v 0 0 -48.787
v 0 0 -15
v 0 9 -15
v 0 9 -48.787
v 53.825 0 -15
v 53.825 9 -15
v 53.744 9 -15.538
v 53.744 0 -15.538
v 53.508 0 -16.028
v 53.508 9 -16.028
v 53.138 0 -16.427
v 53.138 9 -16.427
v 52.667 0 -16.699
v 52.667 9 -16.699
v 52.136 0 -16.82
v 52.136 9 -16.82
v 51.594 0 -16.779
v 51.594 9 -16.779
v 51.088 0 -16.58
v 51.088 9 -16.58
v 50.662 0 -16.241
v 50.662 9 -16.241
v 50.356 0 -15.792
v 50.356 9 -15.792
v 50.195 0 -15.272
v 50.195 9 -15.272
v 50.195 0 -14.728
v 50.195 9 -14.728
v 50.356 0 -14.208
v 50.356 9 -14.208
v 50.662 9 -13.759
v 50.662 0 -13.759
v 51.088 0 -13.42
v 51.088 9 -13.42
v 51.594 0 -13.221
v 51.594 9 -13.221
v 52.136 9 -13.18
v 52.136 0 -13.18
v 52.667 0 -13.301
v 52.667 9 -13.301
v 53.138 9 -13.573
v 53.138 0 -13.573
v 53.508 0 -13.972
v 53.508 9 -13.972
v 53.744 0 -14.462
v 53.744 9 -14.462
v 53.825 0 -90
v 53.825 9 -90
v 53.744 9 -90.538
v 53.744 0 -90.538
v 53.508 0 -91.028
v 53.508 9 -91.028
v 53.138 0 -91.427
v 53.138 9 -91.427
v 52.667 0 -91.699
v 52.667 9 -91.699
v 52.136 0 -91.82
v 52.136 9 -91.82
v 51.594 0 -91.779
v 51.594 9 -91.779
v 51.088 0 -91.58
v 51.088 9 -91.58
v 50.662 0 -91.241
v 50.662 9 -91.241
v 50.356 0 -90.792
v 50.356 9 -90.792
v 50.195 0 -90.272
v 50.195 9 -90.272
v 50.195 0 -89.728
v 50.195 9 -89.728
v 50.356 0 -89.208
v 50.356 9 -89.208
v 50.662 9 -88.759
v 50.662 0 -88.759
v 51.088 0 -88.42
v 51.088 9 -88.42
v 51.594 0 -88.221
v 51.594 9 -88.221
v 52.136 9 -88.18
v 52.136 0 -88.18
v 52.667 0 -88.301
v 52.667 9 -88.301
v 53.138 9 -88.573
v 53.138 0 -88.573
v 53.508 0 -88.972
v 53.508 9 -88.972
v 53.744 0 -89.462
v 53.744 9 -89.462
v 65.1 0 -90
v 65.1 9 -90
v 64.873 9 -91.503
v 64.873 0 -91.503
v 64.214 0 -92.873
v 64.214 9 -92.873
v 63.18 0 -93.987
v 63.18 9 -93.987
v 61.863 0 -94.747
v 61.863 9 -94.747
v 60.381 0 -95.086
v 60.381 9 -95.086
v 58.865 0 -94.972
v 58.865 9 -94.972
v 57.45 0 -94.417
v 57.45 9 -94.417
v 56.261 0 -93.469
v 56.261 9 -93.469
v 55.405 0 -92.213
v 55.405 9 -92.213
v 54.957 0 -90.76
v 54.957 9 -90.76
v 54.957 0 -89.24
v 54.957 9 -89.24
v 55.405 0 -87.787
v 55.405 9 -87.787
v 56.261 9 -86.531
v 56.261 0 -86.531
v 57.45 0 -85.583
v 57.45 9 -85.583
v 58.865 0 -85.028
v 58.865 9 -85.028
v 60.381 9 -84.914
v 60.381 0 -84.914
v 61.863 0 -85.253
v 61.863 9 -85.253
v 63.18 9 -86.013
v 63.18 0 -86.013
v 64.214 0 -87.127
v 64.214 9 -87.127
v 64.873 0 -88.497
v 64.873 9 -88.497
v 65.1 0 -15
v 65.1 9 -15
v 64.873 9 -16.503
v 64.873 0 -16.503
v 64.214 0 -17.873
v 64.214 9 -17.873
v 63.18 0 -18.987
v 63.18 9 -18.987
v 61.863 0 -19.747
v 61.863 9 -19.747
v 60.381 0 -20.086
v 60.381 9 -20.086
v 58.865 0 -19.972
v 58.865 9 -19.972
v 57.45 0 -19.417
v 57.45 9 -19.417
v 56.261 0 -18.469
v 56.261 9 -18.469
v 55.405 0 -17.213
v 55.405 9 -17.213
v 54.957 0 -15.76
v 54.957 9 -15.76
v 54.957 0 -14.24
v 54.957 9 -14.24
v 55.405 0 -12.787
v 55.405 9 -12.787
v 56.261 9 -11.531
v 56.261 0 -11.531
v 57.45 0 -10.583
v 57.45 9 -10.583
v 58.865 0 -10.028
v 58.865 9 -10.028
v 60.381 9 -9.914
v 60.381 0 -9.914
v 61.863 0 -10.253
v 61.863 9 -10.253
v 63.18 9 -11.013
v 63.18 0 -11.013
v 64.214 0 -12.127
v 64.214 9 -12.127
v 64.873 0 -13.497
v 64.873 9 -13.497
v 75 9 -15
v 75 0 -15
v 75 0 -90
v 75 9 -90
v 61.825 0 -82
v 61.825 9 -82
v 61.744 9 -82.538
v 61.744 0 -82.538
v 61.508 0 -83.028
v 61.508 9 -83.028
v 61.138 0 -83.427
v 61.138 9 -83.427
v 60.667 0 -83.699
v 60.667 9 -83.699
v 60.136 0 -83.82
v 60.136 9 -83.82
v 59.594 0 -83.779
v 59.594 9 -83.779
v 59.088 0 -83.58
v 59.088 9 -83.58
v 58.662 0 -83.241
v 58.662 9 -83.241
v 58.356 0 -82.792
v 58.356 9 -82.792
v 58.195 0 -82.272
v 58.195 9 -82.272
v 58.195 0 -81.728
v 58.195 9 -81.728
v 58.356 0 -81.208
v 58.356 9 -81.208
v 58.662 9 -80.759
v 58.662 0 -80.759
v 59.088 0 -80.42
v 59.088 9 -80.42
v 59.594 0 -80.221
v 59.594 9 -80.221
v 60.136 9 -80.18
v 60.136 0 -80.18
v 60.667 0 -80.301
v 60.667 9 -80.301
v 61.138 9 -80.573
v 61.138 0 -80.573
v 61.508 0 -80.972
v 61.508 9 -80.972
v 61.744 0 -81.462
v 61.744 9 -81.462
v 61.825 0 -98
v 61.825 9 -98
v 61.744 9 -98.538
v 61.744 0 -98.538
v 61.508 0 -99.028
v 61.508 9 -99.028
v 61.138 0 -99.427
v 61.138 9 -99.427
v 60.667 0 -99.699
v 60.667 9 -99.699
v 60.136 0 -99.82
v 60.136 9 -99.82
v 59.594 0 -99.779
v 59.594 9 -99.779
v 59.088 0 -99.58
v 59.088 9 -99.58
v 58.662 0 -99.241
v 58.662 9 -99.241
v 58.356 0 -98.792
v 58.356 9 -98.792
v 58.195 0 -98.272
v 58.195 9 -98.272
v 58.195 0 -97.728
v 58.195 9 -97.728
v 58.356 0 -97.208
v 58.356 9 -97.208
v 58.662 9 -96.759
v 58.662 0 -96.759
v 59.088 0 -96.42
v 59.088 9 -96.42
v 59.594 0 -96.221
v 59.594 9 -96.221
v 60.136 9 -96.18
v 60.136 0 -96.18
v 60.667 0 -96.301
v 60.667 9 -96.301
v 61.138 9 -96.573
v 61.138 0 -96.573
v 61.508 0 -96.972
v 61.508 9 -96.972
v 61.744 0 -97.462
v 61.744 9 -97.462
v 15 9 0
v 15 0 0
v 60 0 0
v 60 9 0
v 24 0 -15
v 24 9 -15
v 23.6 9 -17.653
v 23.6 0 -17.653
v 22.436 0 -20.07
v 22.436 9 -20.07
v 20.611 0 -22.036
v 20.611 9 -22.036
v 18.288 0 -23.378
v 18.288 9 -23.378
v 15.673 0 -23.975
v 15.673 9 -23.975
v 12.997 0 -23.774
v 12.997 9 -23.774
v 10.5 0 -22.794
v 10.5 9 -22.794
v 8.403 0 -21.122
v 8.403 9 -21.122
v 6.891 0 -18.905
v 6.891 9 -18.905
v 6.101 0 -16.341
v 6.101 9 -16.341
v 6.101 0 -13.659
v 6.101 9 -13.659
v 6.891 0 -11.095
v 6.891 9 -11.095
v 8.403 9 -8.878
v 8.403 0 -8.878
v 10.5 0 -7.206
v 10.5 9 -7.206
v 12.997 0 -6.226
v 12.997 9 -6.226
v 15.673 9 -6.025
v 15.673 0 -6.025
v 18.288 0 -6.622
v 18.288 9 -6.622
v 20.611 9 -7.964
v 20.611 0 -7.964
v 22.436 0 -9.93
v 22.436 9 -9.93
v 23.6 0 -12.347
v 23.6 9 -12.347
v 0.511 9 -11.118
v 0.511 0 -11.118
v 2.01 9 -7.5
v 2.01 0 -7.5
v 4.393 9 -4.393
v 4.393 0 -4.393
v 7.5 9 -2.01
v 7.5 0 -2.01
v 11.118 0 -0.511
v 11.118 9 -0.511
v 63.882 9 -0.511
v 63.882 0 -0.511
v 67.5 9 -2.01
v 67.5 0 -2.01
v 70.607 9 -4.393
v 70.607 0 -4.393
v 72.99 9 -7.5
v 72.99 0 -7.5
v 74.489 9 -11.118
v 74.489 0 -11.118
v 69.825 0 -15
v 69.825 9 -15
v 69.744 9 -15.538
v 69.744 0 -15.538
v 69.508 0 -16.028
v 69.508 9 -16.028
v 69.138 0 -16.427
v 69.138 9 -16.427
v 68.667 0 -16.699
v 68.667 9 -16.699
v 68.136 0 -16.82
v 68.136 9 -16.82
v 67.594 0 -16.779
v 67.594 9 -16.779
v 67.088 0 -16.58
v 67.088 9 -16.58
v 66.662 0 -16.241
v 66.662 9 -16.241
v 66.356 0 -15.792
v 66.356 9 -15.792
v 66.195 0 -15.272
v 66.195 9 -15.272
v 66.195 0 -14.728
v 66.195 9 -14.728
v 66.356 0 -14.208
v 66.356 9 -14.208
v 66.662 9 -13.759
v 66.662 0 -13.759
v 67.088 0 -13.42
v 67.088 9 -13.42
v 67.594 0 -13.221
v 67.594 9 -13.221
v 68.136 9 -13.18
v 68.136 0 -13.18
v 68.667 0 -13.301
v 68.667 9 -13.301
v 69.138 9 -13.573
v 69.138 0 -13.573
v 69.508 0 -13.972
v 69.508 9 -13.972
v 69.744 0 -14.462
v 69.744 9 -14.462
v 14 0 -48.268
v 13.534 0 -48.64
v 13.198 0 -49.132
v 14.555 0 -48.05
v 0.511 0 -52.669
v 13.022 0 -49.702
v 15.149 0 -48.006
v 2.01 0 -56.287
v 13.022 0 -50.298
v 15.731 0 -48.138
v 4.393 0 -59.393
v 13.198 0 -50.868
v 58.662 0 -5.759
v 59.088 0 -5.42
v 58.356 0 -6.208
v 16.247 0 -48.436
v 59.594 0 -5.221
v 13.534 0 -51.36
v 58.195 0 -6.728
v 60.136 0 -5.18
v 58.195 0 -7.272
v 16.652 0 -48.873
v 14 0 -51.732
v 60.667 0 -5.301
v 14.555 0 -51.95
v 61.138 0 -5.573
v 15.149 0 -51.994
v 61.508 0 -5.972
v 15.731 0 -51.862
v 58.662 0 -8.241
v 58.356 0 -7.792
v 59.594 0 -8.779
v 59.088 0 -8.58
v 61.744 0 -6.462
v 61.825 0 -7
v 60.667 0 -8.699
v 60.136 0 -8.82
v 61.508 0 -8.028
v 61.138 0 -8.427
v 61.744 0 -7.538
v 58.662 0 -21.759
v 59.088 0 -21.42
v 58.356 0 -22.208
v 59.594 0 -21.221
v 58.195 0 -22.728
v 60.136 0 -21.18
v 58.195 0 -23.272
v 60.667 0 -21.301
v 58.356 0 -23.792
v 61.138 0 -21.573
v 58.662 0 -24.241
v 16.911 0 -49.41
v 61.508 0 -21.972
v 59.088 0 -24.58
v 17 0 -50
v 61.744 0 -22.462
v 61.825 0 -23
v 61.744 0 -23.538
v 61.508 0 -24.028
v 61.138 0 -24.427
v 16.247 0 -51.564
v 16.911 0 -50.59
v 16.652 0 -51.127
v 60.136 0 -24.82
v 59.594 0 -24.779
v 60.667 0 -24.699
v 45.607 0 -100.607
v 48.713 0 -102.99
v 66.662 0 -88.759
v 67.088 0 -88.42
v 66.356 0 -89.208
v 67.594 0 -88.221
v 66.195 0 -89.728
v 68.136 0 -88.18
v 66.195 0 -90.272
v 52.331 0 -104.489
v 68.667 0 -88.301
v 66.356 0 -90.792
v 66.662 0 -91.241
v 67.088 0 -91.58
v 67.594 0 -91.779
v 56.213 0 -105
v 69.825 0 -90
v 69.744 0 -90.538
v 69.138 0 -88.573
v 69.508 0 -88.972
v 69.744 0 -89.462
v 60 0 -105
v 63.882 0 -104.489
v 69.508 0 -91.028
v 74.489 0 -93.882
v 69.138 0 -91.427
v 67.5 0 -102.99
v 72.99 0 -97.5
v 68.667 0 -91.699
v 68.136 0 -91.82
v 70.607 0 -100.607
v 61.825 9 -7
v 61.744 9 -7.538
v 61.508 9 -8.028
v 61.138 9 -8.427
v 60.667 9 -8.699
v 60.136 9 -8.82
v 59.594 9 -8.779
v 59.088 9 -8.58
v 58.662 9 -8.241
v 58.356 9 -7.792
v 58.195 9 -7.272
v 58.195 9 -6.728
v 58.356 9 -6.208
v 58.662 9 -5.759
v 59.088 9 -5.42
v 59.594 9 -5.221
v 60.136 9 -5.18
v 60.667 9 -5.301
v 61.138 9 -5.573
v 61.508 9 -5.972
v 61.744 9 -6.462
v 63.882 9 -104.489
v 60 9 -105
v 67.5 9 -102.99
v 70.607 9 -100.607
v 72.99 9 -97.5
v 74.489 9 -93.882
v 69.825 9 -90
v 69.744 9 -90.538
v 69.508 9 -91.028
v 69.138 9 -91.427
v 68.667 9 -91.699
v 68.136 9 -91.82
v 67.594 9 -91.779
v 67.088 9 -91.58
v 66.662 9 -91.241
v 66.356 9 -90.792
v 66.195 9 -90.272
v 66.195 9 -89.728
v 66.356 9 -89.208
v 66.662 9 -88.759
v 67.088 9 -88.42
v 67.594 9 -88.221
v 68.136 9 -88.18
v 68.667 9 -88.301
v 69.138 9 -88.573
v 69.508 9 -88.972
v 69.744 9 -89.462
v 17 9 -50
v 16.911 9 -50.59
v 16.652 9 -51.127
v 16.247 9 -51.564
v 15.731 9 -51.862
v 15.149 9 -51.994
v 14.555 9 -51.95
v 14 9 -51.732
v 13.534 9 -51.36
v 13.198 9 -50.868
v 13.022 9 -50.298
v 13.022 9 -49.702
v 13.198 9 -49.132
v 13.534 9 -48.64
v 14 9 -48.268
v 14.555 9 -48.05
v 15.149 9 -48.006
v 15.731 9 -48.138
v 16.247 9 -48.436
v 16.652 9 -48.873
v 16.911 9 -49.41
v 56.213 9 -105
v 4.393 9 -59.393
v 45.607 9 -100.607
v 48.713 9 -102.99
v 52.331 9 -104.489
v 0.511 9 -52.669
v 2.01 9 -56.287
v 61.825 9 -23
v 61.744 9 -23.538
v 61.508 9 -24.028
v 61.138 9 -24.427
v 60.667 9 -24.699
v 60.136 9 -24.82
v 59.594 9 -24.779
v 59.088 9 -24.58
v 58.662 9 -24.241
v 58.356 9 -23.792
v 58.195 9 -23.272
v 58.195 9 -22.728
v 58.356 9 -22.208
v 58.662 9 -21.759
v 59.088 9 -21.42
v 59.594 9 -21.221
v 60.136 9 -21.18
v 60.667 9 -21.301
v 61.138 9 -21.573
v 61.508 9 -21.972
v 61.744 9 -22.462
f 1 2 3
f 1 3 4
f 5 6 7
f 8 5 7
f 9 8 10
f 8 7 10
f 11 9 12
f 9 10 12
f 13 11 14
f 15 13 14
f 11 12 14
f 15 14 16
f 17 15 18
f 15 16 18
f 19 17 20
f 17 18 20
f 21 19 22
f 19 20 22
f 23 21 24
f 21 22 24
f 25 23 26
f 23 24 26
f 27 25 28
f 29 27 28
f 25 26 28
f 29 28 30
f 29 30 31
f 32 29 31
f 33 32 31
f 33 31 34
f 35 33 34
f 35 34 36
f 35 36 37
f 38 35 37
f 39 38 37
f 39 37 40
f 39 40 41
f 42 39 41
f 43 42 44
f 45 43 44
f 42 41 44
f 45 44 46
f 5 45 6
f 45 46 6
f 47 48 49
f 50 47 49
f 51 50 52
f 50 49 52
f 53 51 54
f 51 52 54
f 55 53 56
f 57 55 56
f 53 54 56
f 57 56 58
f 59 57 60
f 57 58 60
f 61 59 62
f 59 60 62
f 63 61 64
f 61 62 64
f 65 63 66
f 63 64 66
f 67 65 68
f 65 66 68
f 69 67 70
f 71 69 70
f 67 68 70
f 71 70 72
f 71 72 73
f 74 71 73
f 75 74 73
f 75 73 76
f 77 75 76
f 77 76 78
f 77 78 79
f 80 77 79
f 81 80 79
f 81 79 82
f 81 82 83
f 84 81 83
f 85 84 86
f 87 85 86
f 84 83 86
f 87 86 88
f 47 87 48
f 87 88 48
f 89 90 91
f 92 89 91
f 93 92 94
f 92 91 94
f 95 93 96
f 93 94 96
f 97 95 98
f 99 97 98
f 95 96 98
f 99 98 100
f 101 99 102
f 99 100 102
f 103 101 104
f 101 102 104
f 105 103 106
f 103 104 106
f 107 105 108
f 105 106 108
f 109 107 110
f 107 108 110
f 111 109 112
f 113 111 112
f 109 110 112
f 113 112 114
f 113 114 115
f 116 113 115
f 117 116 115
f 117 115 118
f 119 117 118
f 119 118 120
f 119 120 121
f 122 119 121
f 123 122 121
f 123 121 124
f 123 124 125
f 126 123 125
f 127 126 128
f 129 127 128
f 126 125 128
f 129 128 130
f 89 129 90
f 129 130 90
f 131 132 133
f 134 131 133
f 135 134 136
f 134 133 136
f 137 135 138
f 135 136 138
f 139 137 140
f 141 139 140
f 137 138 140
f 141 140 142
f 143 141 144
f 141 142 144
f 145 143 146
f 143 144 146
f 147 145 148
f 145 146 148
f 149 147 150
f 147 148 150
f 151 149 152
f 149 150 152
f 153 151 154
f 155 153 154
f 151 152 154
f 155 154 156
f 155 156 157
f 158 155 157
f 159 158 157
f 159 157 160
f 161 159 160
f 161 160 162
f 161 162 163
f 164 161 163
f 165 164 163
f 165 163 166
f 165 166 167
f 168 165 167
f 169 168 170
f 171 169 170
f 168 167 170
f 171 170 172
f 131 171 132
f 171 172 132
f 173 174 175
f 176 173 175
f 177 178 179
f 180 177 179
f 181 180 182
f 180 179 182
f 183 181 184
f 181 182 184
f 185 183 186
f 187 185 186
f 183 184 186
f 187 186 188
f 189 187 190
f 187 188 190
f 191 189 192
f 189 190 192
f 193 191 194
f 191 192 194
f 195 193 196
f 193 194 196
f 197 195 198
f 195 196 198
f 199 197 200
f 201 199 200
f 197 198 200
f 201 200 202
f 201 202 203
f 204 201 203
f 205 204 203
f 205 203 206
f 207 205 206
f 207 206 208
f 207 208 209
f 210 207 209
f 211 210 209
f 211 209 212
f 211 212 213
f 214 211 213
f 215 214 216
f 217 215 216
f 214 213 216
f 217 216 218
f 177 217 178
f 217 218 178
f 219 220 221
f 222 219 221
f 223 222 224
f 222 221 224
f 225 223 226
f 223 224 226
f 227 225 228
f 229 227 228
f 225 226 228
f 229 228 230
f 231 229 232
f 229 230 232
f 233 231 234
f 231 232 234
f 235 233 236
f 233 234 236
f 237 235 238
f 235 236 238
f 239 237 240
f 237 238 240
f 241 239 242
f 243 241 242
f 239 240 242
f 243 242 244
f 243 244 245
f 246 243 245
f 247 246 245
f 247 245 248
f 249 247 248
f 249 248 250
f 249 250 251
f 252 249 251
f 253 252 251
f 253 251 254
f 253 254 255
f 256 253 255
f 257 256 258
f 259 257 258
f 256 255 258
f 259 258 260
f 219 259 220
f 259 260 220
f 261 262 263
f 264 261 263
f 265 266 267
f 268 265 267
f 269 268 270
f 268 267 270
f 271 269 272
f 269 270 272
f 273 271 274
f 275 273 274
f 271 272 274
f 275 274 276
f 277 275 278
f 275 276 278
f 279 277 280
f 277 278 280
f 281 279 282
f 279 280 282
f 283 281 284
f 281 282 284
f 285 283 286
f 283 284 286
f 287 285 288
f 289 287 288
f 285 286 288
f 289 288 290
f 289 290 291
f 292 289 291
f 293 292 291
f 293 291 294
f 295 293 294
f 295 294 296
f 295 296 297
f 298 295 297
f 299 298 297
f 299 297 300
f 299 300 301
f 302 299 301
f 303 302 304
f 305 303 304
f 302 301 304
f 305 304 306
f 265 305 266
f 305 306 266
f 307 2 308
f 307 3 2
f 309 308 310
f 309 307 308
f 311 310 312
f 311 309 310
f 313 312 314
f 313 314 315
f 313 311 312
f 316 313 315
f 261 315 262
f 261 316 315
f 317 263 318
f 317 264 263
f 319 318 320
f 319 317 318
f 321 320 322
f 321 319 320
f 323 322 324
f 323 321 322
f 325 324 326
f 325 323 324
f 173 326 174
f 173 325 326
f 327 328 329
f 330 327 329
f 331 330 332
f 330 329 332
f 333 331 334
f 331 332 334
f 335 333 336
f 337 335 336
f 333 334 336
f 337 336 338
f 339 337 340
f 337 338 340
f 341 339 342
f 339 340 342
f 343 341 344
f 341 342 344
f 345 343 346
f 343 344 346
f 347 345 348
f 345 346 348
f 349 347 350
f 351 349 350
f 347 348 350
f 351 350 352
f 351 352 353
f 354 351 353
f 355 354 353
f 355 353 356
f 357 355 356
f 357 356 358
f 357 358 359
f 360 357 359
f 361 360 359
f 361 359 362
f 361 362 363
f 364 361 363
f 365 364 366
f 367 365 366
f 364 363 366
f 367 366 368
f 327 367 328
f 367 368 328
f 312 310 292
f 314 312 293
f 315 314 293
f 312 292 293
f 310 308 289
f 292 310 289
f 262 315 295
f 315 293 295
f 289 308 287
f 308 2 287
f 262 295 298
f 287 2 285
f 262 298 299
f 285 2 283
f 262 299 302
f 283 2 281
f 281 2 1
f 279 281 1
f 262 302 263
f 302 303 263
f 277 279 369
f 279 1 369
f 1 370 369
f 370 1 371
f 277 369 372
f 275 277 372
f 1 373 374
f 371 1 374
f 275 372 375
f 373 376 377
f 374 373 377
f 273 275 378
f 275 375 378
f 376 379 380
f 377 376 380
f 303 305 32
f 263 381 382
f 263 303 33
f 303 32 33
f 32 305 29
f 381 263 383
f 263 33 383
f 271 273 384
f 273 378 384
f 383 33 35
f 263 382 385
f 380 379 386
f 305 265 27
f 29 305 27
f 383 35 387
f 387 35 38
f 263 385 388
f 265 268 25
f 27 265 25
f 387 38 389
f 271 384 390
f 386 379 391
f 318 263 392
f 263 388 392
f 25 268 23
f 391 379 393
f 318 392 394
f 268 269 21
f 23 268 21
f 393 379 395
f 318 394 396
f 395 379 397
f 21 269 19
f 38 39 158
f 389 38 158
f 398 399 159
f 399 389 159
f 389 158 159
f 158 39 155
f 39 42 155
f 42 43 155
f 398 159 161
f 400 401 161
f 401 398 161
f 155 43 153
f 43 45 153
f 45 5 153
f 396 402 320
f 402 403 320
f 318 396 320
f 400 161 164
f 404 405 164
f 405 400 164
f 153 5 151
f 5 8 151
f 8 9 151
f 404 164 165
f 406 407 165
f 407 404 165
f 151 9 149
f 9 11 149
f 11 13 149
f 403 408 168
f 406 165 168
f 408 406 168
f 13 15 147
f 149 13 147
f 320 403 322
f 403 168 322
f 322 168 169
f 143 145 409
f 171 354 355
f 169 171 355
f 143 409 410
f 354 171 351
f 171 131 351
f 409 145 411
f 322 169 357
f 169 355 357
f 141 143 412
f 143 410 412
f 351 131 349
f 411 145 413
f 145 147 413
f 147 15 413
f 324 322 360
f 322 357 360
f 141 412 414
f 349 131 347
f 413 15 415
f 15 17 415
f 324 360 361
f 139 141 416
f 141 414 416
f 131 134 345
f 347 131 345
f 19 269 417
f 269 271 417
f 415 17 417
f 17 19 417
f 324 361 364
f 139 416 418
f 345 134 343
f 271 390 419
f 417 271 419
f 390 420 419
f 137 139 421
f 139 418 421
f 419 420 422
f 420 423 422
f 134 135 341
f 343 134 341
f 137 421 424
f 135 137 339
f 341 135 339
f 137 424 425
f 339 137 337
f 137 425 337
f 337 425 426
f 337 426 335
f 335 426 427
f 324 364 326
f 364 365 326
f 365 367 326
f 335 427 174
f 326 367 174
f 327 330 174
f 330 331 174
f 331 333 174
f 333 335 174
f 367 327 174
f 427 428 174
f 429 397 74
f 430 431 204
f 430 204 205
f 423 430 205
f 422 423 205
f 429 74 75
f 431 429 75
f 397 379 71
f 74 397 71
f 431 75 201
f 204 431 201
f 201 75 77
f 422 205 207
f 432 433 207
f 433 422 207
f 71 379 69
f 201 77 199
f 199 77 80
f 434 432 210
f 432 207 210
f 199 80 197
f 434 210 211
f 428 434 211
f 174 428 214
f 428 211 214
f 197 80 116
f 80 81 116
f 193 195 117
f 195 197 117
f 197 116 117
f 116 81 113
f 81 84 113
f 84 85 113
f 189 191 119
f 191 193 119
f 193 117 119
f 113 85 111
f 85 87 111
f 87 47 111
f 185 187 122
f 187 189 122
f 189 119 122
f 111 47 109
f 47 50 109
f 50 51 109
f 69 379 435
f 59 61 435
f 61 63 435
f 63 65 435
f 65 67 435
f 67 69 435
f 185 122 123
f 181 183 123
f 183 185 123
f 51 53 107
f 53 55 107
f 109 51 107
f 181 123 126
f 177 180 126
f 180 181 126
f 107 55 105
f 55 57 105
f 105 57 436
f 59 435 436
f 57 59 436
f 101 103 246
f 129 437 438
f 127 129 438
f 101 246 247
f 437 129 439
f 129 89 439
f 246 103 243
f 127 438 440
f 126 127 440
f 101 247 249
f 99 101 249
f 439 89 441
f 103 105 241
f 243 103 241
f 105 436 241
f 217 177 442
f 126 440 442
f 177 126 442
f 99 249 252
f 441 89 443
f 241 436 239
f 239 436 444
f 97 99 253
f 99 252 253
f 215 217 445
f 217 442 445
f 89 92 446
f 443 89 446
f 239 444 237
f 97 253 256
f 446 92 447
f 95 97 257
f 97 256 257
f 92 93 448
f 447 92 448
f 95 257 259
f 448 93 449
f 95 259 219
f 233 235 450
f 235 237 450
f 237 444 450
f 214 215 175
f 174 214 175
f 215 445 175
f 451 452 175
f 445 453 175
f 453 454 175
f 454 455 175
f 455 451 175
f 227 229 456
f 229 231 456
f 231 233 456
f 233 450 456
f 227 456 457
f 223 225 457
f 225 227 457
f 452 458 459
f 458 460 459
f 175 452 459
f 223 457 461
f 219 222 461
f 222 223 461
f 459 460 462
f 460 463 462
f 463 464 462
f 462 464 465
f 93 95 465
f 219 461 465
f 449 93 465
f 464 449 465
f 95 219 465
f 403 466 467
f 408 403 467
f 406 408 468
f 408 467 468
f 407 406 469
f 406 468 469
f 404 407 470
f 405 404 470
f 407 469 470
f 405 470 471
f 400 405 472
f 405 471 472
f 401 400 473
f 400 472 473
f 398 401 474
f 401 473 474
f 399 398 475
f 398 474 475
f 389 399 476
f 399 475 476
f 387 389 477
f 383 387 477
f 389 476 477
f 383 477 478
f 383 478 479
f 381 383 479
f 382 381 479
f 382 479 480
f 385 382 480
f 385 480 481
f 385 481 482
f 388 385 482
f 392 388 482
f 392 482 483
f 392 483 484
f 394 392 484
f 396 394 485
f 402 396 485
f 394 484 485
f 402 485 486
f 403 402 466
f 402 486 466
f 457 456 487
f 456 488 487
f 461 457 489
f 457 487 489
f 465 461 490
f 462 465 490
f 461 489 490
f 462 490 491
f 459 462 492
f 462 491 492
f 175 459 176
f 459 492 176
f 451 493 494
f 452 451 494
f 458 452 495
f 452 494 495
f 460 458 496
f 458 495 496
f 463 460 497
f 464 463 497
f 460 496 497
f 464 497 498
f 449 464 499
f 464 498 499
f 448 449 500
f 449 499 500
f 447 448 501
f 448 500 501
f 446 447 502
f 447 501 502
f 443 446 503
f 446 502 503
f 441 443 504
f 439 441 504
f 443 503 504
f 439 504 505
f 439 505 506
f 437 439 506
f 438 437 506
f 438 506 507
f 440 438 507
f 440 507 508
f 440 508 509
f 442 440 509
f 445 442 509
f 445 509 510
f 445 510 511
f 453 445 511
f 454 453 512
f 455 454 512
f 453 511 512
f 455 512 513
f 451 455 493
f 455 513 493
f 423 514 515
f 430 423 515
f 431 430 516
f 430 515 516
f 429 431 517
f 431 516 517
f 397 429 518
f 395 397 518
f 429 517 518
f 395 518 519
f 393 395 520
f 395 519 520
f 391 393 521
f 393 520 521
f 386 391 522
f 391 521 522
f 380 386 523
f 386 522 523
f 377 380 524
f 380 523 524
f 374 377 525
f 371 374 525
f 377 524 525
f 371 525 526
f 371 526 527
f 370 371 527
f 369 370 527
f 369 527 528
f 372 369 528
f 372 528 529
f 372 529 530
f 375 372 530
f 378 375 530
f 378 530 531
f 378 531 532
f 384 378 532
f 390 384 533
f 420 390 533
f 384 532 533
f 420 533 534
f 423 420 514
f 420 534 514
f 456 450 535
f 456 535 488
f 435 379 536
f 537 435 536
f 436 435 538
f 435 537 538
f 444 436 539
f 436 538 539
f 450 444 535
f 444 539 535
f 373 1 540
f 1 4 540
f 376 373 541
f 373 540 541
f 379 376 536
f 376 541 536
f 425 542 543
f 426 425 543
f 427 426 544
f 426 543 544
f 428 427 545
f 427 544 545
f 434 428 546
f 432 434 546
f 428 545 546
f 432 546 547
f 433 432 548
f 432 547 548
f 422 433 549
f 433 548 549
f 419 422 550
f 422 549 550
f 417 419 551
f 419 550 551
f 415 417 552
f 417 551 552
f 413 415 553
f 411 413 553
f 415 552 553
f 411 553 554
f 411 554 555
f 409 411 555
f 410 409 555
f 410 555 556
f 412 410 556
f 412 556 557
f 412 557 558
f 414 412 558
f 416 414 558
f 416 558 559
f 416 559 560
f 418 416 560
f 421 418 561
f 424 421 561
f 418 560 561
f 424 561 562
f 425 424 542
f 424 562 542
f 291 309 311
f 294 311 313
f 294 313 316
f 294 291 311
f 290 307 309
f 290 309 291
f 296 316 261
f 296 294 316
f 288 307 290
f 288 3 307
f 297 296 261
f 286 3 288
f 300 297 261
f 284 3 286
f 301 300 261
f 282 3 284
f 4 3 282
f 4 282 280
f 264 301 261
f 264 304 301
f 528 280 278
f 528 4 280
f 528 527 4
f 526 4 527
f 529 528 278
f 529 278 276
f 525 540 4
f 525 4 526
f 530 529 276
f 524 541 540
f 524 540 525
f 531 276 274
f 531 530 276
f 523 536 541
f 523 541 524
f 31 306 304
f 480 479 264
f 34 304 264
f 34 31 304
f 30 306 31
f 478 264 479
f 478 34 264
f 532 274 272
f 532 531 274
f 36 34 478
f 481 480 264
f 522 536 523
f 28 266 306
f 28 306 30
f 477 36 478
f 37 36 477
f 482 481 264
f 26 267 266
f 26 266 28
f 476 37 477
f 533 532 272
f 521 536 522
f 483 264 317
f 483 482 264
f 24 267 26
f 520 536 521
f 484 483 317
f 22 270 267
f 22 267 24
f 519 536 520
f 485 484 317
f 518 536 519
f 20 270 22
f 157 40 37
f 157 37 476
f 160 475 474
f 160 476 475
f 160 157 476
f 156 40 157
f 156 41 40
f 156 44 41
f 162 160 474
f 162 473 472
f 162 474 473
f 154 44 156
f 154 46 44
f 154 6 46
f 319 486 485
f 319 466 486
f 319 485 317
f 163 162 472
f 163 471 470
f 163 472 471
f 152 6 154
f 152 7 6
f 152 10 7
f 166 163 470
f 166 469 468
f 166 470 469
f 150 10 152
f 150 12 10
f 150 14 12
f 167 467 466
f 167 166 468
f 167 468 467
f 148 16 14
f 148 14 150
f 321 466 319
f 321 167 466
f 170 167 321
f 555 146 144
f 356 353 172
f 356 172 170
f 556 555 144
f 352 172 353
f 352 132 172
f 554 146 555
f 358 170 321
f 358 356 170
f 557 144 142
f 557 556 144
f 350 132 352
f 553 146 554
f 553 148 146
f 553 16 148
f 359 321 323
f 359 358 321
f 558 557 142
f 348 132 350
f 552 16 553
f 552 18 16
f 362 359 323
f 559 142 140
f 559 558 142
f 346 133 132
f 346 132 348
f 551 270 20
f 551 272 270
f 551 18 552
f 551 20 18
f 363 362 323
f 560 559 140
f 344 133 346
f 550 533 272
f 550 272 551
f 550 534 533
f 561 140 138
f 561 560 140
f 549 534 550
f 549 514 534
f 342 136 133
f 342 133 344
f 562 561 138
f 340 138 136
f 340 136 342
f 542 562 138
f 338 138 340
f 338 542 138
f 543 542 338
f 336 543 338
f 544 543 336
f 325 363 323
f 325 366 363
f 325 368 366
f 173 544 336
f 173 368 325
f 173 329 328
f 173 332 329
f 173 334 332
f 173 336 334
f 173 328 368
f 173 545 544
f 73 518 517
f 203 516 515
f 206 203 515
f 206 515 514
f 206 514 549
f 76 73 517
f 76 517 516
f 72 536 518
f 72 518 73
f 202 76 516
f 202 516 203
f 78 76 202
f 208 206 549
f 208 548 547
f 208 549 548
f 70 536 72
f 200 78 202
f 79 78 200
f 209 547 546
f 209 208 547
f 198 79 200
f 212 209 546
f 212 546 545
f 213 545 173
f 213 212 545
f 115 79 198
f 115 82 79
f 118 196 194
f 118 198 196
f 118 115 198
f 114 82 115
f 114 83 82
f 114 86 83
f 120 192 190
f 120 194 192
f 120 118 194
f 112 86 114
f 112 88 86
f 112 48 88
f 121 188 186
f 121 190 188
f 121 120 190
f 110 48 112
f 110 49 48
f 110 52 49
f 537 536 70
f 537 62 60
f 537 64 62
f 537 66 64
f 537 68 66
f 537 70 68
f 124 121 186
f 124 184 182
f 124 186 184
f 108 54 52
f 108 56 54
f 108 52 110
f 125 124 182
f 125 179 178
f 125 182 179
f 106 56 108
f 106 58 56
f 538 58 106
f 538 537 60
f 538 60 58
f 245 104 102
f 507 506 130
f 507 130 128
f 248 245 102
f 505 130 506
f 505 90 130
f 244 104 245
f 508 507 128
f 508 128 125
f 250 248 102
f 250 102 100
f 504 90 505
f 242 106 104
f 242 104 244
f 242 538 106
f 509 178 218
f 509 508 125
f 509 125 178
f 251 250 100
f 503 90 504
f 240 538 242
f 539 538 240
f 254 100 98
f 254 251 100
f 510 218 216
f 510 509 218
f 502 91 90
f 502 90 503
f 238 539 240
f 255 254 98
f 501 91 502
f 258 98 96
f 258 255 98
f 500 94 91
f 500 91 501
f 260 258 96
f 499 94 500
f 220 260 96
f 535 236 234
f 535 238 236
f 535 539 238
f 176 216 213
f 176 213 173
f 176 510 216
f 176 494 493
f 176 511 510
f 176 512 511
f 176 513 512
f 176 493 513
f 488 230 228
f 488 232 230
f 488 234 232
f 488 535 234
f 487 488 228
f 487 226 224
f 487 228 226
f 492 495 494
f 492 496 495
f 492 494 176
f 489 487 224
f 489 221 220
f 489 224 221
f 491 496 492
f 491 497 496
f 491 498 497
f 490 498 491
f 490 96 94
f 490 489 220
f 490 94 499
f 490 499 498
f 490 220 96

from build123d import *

# Parameters (mm, degrees)
SKETCH1_W           = 75
SKETCH1_H           = 105
BOSS_EXTRUDE1_DEPTH = 9
SKETCH2_R           = 9
SKETCH2_R_2         = 2
SKETCH2_R_3         = 5.1
SKETCH2_R_4         = 1.825
CUT_EXTRUDE1_DEPTH  = 9
CHAMFER1_SIZE       = 50
FILLET1_R           = 15


with BuildPart() as part:
    # Sketch1 → Boss-Extrude1 (new body)
    with BuildSketch(Plane(origin=(0, 0, 0), x_dir=(1, 0, 0), z_dir=(0, 1, 0))):
        with Locations((37.5, 52.5)):
            Rectangle(SKETCH1_W, SKETCH1_H)
    extrude(amount=BOSS_EXTRUDE1_DEPTH)

    # Sketch2 → Cut-Extrude1 (cut)
    with BuildSketch(Plane(origin=(0, 9, 0), x_dir=(1, 0, 0), z_dir=(0, 1, 0))):
        with Locations((15, 15)):
            Circle(SKETCH2_R)
        with Locations((15, 50)):
            Circle(SKETCH2_R_2)
        with Locations((60, 15)):
            Circle(SKETCH2_R_3)
        with Locations((60, 23)):
            Circle(SKETCH2_R_4)
        with Locations((60, 7)):
            Circle(SKETCH2_R_4)
        with Locations((68, 15)):
            Circle(SKETCH2_R_4)
        with Locations((52, 15)):
            Circle(SKETCH2_R_4)
        with Locations((60, 90)):
            Circle(SKETCH2_R_3)
        with Locations((60, 98)):
            Circle(SKETCH2_R_4)
        with Locations((60, 82)):
            Circle(SKETCH2_R_4)
        with Locations((68, 90)):
            Circle(SKETCH2_R_4)
        with Locations((52, 90)):
            Circle(SKETCH2_R_4)
    extrude(amount=-CUT_EXTRUDE1_DEPTH, mode=Mode.SUBTRACT)

    # Chamfer1
    chamfer1_edges = [part.edges().sort_by_distance(p)[0] for p in [
        (0, 4.5, -105),
    ]]
    chamfer(chamfer1_edges, length=CHAMFER1_SIZE)

    # Fillet1
    fillet1_edges = [part.edges().sort_by_distance(p)[0] for p in [
        (0, 4.5, -55),
        (50, 4.5, -105),
        (75, 4.5, -105),
        (75, 4.5, 0),
        (0, 4.5, 0),
    ]]
    fillet(fillet1_edges, radius=FILLET1_R)


solid = part.part
